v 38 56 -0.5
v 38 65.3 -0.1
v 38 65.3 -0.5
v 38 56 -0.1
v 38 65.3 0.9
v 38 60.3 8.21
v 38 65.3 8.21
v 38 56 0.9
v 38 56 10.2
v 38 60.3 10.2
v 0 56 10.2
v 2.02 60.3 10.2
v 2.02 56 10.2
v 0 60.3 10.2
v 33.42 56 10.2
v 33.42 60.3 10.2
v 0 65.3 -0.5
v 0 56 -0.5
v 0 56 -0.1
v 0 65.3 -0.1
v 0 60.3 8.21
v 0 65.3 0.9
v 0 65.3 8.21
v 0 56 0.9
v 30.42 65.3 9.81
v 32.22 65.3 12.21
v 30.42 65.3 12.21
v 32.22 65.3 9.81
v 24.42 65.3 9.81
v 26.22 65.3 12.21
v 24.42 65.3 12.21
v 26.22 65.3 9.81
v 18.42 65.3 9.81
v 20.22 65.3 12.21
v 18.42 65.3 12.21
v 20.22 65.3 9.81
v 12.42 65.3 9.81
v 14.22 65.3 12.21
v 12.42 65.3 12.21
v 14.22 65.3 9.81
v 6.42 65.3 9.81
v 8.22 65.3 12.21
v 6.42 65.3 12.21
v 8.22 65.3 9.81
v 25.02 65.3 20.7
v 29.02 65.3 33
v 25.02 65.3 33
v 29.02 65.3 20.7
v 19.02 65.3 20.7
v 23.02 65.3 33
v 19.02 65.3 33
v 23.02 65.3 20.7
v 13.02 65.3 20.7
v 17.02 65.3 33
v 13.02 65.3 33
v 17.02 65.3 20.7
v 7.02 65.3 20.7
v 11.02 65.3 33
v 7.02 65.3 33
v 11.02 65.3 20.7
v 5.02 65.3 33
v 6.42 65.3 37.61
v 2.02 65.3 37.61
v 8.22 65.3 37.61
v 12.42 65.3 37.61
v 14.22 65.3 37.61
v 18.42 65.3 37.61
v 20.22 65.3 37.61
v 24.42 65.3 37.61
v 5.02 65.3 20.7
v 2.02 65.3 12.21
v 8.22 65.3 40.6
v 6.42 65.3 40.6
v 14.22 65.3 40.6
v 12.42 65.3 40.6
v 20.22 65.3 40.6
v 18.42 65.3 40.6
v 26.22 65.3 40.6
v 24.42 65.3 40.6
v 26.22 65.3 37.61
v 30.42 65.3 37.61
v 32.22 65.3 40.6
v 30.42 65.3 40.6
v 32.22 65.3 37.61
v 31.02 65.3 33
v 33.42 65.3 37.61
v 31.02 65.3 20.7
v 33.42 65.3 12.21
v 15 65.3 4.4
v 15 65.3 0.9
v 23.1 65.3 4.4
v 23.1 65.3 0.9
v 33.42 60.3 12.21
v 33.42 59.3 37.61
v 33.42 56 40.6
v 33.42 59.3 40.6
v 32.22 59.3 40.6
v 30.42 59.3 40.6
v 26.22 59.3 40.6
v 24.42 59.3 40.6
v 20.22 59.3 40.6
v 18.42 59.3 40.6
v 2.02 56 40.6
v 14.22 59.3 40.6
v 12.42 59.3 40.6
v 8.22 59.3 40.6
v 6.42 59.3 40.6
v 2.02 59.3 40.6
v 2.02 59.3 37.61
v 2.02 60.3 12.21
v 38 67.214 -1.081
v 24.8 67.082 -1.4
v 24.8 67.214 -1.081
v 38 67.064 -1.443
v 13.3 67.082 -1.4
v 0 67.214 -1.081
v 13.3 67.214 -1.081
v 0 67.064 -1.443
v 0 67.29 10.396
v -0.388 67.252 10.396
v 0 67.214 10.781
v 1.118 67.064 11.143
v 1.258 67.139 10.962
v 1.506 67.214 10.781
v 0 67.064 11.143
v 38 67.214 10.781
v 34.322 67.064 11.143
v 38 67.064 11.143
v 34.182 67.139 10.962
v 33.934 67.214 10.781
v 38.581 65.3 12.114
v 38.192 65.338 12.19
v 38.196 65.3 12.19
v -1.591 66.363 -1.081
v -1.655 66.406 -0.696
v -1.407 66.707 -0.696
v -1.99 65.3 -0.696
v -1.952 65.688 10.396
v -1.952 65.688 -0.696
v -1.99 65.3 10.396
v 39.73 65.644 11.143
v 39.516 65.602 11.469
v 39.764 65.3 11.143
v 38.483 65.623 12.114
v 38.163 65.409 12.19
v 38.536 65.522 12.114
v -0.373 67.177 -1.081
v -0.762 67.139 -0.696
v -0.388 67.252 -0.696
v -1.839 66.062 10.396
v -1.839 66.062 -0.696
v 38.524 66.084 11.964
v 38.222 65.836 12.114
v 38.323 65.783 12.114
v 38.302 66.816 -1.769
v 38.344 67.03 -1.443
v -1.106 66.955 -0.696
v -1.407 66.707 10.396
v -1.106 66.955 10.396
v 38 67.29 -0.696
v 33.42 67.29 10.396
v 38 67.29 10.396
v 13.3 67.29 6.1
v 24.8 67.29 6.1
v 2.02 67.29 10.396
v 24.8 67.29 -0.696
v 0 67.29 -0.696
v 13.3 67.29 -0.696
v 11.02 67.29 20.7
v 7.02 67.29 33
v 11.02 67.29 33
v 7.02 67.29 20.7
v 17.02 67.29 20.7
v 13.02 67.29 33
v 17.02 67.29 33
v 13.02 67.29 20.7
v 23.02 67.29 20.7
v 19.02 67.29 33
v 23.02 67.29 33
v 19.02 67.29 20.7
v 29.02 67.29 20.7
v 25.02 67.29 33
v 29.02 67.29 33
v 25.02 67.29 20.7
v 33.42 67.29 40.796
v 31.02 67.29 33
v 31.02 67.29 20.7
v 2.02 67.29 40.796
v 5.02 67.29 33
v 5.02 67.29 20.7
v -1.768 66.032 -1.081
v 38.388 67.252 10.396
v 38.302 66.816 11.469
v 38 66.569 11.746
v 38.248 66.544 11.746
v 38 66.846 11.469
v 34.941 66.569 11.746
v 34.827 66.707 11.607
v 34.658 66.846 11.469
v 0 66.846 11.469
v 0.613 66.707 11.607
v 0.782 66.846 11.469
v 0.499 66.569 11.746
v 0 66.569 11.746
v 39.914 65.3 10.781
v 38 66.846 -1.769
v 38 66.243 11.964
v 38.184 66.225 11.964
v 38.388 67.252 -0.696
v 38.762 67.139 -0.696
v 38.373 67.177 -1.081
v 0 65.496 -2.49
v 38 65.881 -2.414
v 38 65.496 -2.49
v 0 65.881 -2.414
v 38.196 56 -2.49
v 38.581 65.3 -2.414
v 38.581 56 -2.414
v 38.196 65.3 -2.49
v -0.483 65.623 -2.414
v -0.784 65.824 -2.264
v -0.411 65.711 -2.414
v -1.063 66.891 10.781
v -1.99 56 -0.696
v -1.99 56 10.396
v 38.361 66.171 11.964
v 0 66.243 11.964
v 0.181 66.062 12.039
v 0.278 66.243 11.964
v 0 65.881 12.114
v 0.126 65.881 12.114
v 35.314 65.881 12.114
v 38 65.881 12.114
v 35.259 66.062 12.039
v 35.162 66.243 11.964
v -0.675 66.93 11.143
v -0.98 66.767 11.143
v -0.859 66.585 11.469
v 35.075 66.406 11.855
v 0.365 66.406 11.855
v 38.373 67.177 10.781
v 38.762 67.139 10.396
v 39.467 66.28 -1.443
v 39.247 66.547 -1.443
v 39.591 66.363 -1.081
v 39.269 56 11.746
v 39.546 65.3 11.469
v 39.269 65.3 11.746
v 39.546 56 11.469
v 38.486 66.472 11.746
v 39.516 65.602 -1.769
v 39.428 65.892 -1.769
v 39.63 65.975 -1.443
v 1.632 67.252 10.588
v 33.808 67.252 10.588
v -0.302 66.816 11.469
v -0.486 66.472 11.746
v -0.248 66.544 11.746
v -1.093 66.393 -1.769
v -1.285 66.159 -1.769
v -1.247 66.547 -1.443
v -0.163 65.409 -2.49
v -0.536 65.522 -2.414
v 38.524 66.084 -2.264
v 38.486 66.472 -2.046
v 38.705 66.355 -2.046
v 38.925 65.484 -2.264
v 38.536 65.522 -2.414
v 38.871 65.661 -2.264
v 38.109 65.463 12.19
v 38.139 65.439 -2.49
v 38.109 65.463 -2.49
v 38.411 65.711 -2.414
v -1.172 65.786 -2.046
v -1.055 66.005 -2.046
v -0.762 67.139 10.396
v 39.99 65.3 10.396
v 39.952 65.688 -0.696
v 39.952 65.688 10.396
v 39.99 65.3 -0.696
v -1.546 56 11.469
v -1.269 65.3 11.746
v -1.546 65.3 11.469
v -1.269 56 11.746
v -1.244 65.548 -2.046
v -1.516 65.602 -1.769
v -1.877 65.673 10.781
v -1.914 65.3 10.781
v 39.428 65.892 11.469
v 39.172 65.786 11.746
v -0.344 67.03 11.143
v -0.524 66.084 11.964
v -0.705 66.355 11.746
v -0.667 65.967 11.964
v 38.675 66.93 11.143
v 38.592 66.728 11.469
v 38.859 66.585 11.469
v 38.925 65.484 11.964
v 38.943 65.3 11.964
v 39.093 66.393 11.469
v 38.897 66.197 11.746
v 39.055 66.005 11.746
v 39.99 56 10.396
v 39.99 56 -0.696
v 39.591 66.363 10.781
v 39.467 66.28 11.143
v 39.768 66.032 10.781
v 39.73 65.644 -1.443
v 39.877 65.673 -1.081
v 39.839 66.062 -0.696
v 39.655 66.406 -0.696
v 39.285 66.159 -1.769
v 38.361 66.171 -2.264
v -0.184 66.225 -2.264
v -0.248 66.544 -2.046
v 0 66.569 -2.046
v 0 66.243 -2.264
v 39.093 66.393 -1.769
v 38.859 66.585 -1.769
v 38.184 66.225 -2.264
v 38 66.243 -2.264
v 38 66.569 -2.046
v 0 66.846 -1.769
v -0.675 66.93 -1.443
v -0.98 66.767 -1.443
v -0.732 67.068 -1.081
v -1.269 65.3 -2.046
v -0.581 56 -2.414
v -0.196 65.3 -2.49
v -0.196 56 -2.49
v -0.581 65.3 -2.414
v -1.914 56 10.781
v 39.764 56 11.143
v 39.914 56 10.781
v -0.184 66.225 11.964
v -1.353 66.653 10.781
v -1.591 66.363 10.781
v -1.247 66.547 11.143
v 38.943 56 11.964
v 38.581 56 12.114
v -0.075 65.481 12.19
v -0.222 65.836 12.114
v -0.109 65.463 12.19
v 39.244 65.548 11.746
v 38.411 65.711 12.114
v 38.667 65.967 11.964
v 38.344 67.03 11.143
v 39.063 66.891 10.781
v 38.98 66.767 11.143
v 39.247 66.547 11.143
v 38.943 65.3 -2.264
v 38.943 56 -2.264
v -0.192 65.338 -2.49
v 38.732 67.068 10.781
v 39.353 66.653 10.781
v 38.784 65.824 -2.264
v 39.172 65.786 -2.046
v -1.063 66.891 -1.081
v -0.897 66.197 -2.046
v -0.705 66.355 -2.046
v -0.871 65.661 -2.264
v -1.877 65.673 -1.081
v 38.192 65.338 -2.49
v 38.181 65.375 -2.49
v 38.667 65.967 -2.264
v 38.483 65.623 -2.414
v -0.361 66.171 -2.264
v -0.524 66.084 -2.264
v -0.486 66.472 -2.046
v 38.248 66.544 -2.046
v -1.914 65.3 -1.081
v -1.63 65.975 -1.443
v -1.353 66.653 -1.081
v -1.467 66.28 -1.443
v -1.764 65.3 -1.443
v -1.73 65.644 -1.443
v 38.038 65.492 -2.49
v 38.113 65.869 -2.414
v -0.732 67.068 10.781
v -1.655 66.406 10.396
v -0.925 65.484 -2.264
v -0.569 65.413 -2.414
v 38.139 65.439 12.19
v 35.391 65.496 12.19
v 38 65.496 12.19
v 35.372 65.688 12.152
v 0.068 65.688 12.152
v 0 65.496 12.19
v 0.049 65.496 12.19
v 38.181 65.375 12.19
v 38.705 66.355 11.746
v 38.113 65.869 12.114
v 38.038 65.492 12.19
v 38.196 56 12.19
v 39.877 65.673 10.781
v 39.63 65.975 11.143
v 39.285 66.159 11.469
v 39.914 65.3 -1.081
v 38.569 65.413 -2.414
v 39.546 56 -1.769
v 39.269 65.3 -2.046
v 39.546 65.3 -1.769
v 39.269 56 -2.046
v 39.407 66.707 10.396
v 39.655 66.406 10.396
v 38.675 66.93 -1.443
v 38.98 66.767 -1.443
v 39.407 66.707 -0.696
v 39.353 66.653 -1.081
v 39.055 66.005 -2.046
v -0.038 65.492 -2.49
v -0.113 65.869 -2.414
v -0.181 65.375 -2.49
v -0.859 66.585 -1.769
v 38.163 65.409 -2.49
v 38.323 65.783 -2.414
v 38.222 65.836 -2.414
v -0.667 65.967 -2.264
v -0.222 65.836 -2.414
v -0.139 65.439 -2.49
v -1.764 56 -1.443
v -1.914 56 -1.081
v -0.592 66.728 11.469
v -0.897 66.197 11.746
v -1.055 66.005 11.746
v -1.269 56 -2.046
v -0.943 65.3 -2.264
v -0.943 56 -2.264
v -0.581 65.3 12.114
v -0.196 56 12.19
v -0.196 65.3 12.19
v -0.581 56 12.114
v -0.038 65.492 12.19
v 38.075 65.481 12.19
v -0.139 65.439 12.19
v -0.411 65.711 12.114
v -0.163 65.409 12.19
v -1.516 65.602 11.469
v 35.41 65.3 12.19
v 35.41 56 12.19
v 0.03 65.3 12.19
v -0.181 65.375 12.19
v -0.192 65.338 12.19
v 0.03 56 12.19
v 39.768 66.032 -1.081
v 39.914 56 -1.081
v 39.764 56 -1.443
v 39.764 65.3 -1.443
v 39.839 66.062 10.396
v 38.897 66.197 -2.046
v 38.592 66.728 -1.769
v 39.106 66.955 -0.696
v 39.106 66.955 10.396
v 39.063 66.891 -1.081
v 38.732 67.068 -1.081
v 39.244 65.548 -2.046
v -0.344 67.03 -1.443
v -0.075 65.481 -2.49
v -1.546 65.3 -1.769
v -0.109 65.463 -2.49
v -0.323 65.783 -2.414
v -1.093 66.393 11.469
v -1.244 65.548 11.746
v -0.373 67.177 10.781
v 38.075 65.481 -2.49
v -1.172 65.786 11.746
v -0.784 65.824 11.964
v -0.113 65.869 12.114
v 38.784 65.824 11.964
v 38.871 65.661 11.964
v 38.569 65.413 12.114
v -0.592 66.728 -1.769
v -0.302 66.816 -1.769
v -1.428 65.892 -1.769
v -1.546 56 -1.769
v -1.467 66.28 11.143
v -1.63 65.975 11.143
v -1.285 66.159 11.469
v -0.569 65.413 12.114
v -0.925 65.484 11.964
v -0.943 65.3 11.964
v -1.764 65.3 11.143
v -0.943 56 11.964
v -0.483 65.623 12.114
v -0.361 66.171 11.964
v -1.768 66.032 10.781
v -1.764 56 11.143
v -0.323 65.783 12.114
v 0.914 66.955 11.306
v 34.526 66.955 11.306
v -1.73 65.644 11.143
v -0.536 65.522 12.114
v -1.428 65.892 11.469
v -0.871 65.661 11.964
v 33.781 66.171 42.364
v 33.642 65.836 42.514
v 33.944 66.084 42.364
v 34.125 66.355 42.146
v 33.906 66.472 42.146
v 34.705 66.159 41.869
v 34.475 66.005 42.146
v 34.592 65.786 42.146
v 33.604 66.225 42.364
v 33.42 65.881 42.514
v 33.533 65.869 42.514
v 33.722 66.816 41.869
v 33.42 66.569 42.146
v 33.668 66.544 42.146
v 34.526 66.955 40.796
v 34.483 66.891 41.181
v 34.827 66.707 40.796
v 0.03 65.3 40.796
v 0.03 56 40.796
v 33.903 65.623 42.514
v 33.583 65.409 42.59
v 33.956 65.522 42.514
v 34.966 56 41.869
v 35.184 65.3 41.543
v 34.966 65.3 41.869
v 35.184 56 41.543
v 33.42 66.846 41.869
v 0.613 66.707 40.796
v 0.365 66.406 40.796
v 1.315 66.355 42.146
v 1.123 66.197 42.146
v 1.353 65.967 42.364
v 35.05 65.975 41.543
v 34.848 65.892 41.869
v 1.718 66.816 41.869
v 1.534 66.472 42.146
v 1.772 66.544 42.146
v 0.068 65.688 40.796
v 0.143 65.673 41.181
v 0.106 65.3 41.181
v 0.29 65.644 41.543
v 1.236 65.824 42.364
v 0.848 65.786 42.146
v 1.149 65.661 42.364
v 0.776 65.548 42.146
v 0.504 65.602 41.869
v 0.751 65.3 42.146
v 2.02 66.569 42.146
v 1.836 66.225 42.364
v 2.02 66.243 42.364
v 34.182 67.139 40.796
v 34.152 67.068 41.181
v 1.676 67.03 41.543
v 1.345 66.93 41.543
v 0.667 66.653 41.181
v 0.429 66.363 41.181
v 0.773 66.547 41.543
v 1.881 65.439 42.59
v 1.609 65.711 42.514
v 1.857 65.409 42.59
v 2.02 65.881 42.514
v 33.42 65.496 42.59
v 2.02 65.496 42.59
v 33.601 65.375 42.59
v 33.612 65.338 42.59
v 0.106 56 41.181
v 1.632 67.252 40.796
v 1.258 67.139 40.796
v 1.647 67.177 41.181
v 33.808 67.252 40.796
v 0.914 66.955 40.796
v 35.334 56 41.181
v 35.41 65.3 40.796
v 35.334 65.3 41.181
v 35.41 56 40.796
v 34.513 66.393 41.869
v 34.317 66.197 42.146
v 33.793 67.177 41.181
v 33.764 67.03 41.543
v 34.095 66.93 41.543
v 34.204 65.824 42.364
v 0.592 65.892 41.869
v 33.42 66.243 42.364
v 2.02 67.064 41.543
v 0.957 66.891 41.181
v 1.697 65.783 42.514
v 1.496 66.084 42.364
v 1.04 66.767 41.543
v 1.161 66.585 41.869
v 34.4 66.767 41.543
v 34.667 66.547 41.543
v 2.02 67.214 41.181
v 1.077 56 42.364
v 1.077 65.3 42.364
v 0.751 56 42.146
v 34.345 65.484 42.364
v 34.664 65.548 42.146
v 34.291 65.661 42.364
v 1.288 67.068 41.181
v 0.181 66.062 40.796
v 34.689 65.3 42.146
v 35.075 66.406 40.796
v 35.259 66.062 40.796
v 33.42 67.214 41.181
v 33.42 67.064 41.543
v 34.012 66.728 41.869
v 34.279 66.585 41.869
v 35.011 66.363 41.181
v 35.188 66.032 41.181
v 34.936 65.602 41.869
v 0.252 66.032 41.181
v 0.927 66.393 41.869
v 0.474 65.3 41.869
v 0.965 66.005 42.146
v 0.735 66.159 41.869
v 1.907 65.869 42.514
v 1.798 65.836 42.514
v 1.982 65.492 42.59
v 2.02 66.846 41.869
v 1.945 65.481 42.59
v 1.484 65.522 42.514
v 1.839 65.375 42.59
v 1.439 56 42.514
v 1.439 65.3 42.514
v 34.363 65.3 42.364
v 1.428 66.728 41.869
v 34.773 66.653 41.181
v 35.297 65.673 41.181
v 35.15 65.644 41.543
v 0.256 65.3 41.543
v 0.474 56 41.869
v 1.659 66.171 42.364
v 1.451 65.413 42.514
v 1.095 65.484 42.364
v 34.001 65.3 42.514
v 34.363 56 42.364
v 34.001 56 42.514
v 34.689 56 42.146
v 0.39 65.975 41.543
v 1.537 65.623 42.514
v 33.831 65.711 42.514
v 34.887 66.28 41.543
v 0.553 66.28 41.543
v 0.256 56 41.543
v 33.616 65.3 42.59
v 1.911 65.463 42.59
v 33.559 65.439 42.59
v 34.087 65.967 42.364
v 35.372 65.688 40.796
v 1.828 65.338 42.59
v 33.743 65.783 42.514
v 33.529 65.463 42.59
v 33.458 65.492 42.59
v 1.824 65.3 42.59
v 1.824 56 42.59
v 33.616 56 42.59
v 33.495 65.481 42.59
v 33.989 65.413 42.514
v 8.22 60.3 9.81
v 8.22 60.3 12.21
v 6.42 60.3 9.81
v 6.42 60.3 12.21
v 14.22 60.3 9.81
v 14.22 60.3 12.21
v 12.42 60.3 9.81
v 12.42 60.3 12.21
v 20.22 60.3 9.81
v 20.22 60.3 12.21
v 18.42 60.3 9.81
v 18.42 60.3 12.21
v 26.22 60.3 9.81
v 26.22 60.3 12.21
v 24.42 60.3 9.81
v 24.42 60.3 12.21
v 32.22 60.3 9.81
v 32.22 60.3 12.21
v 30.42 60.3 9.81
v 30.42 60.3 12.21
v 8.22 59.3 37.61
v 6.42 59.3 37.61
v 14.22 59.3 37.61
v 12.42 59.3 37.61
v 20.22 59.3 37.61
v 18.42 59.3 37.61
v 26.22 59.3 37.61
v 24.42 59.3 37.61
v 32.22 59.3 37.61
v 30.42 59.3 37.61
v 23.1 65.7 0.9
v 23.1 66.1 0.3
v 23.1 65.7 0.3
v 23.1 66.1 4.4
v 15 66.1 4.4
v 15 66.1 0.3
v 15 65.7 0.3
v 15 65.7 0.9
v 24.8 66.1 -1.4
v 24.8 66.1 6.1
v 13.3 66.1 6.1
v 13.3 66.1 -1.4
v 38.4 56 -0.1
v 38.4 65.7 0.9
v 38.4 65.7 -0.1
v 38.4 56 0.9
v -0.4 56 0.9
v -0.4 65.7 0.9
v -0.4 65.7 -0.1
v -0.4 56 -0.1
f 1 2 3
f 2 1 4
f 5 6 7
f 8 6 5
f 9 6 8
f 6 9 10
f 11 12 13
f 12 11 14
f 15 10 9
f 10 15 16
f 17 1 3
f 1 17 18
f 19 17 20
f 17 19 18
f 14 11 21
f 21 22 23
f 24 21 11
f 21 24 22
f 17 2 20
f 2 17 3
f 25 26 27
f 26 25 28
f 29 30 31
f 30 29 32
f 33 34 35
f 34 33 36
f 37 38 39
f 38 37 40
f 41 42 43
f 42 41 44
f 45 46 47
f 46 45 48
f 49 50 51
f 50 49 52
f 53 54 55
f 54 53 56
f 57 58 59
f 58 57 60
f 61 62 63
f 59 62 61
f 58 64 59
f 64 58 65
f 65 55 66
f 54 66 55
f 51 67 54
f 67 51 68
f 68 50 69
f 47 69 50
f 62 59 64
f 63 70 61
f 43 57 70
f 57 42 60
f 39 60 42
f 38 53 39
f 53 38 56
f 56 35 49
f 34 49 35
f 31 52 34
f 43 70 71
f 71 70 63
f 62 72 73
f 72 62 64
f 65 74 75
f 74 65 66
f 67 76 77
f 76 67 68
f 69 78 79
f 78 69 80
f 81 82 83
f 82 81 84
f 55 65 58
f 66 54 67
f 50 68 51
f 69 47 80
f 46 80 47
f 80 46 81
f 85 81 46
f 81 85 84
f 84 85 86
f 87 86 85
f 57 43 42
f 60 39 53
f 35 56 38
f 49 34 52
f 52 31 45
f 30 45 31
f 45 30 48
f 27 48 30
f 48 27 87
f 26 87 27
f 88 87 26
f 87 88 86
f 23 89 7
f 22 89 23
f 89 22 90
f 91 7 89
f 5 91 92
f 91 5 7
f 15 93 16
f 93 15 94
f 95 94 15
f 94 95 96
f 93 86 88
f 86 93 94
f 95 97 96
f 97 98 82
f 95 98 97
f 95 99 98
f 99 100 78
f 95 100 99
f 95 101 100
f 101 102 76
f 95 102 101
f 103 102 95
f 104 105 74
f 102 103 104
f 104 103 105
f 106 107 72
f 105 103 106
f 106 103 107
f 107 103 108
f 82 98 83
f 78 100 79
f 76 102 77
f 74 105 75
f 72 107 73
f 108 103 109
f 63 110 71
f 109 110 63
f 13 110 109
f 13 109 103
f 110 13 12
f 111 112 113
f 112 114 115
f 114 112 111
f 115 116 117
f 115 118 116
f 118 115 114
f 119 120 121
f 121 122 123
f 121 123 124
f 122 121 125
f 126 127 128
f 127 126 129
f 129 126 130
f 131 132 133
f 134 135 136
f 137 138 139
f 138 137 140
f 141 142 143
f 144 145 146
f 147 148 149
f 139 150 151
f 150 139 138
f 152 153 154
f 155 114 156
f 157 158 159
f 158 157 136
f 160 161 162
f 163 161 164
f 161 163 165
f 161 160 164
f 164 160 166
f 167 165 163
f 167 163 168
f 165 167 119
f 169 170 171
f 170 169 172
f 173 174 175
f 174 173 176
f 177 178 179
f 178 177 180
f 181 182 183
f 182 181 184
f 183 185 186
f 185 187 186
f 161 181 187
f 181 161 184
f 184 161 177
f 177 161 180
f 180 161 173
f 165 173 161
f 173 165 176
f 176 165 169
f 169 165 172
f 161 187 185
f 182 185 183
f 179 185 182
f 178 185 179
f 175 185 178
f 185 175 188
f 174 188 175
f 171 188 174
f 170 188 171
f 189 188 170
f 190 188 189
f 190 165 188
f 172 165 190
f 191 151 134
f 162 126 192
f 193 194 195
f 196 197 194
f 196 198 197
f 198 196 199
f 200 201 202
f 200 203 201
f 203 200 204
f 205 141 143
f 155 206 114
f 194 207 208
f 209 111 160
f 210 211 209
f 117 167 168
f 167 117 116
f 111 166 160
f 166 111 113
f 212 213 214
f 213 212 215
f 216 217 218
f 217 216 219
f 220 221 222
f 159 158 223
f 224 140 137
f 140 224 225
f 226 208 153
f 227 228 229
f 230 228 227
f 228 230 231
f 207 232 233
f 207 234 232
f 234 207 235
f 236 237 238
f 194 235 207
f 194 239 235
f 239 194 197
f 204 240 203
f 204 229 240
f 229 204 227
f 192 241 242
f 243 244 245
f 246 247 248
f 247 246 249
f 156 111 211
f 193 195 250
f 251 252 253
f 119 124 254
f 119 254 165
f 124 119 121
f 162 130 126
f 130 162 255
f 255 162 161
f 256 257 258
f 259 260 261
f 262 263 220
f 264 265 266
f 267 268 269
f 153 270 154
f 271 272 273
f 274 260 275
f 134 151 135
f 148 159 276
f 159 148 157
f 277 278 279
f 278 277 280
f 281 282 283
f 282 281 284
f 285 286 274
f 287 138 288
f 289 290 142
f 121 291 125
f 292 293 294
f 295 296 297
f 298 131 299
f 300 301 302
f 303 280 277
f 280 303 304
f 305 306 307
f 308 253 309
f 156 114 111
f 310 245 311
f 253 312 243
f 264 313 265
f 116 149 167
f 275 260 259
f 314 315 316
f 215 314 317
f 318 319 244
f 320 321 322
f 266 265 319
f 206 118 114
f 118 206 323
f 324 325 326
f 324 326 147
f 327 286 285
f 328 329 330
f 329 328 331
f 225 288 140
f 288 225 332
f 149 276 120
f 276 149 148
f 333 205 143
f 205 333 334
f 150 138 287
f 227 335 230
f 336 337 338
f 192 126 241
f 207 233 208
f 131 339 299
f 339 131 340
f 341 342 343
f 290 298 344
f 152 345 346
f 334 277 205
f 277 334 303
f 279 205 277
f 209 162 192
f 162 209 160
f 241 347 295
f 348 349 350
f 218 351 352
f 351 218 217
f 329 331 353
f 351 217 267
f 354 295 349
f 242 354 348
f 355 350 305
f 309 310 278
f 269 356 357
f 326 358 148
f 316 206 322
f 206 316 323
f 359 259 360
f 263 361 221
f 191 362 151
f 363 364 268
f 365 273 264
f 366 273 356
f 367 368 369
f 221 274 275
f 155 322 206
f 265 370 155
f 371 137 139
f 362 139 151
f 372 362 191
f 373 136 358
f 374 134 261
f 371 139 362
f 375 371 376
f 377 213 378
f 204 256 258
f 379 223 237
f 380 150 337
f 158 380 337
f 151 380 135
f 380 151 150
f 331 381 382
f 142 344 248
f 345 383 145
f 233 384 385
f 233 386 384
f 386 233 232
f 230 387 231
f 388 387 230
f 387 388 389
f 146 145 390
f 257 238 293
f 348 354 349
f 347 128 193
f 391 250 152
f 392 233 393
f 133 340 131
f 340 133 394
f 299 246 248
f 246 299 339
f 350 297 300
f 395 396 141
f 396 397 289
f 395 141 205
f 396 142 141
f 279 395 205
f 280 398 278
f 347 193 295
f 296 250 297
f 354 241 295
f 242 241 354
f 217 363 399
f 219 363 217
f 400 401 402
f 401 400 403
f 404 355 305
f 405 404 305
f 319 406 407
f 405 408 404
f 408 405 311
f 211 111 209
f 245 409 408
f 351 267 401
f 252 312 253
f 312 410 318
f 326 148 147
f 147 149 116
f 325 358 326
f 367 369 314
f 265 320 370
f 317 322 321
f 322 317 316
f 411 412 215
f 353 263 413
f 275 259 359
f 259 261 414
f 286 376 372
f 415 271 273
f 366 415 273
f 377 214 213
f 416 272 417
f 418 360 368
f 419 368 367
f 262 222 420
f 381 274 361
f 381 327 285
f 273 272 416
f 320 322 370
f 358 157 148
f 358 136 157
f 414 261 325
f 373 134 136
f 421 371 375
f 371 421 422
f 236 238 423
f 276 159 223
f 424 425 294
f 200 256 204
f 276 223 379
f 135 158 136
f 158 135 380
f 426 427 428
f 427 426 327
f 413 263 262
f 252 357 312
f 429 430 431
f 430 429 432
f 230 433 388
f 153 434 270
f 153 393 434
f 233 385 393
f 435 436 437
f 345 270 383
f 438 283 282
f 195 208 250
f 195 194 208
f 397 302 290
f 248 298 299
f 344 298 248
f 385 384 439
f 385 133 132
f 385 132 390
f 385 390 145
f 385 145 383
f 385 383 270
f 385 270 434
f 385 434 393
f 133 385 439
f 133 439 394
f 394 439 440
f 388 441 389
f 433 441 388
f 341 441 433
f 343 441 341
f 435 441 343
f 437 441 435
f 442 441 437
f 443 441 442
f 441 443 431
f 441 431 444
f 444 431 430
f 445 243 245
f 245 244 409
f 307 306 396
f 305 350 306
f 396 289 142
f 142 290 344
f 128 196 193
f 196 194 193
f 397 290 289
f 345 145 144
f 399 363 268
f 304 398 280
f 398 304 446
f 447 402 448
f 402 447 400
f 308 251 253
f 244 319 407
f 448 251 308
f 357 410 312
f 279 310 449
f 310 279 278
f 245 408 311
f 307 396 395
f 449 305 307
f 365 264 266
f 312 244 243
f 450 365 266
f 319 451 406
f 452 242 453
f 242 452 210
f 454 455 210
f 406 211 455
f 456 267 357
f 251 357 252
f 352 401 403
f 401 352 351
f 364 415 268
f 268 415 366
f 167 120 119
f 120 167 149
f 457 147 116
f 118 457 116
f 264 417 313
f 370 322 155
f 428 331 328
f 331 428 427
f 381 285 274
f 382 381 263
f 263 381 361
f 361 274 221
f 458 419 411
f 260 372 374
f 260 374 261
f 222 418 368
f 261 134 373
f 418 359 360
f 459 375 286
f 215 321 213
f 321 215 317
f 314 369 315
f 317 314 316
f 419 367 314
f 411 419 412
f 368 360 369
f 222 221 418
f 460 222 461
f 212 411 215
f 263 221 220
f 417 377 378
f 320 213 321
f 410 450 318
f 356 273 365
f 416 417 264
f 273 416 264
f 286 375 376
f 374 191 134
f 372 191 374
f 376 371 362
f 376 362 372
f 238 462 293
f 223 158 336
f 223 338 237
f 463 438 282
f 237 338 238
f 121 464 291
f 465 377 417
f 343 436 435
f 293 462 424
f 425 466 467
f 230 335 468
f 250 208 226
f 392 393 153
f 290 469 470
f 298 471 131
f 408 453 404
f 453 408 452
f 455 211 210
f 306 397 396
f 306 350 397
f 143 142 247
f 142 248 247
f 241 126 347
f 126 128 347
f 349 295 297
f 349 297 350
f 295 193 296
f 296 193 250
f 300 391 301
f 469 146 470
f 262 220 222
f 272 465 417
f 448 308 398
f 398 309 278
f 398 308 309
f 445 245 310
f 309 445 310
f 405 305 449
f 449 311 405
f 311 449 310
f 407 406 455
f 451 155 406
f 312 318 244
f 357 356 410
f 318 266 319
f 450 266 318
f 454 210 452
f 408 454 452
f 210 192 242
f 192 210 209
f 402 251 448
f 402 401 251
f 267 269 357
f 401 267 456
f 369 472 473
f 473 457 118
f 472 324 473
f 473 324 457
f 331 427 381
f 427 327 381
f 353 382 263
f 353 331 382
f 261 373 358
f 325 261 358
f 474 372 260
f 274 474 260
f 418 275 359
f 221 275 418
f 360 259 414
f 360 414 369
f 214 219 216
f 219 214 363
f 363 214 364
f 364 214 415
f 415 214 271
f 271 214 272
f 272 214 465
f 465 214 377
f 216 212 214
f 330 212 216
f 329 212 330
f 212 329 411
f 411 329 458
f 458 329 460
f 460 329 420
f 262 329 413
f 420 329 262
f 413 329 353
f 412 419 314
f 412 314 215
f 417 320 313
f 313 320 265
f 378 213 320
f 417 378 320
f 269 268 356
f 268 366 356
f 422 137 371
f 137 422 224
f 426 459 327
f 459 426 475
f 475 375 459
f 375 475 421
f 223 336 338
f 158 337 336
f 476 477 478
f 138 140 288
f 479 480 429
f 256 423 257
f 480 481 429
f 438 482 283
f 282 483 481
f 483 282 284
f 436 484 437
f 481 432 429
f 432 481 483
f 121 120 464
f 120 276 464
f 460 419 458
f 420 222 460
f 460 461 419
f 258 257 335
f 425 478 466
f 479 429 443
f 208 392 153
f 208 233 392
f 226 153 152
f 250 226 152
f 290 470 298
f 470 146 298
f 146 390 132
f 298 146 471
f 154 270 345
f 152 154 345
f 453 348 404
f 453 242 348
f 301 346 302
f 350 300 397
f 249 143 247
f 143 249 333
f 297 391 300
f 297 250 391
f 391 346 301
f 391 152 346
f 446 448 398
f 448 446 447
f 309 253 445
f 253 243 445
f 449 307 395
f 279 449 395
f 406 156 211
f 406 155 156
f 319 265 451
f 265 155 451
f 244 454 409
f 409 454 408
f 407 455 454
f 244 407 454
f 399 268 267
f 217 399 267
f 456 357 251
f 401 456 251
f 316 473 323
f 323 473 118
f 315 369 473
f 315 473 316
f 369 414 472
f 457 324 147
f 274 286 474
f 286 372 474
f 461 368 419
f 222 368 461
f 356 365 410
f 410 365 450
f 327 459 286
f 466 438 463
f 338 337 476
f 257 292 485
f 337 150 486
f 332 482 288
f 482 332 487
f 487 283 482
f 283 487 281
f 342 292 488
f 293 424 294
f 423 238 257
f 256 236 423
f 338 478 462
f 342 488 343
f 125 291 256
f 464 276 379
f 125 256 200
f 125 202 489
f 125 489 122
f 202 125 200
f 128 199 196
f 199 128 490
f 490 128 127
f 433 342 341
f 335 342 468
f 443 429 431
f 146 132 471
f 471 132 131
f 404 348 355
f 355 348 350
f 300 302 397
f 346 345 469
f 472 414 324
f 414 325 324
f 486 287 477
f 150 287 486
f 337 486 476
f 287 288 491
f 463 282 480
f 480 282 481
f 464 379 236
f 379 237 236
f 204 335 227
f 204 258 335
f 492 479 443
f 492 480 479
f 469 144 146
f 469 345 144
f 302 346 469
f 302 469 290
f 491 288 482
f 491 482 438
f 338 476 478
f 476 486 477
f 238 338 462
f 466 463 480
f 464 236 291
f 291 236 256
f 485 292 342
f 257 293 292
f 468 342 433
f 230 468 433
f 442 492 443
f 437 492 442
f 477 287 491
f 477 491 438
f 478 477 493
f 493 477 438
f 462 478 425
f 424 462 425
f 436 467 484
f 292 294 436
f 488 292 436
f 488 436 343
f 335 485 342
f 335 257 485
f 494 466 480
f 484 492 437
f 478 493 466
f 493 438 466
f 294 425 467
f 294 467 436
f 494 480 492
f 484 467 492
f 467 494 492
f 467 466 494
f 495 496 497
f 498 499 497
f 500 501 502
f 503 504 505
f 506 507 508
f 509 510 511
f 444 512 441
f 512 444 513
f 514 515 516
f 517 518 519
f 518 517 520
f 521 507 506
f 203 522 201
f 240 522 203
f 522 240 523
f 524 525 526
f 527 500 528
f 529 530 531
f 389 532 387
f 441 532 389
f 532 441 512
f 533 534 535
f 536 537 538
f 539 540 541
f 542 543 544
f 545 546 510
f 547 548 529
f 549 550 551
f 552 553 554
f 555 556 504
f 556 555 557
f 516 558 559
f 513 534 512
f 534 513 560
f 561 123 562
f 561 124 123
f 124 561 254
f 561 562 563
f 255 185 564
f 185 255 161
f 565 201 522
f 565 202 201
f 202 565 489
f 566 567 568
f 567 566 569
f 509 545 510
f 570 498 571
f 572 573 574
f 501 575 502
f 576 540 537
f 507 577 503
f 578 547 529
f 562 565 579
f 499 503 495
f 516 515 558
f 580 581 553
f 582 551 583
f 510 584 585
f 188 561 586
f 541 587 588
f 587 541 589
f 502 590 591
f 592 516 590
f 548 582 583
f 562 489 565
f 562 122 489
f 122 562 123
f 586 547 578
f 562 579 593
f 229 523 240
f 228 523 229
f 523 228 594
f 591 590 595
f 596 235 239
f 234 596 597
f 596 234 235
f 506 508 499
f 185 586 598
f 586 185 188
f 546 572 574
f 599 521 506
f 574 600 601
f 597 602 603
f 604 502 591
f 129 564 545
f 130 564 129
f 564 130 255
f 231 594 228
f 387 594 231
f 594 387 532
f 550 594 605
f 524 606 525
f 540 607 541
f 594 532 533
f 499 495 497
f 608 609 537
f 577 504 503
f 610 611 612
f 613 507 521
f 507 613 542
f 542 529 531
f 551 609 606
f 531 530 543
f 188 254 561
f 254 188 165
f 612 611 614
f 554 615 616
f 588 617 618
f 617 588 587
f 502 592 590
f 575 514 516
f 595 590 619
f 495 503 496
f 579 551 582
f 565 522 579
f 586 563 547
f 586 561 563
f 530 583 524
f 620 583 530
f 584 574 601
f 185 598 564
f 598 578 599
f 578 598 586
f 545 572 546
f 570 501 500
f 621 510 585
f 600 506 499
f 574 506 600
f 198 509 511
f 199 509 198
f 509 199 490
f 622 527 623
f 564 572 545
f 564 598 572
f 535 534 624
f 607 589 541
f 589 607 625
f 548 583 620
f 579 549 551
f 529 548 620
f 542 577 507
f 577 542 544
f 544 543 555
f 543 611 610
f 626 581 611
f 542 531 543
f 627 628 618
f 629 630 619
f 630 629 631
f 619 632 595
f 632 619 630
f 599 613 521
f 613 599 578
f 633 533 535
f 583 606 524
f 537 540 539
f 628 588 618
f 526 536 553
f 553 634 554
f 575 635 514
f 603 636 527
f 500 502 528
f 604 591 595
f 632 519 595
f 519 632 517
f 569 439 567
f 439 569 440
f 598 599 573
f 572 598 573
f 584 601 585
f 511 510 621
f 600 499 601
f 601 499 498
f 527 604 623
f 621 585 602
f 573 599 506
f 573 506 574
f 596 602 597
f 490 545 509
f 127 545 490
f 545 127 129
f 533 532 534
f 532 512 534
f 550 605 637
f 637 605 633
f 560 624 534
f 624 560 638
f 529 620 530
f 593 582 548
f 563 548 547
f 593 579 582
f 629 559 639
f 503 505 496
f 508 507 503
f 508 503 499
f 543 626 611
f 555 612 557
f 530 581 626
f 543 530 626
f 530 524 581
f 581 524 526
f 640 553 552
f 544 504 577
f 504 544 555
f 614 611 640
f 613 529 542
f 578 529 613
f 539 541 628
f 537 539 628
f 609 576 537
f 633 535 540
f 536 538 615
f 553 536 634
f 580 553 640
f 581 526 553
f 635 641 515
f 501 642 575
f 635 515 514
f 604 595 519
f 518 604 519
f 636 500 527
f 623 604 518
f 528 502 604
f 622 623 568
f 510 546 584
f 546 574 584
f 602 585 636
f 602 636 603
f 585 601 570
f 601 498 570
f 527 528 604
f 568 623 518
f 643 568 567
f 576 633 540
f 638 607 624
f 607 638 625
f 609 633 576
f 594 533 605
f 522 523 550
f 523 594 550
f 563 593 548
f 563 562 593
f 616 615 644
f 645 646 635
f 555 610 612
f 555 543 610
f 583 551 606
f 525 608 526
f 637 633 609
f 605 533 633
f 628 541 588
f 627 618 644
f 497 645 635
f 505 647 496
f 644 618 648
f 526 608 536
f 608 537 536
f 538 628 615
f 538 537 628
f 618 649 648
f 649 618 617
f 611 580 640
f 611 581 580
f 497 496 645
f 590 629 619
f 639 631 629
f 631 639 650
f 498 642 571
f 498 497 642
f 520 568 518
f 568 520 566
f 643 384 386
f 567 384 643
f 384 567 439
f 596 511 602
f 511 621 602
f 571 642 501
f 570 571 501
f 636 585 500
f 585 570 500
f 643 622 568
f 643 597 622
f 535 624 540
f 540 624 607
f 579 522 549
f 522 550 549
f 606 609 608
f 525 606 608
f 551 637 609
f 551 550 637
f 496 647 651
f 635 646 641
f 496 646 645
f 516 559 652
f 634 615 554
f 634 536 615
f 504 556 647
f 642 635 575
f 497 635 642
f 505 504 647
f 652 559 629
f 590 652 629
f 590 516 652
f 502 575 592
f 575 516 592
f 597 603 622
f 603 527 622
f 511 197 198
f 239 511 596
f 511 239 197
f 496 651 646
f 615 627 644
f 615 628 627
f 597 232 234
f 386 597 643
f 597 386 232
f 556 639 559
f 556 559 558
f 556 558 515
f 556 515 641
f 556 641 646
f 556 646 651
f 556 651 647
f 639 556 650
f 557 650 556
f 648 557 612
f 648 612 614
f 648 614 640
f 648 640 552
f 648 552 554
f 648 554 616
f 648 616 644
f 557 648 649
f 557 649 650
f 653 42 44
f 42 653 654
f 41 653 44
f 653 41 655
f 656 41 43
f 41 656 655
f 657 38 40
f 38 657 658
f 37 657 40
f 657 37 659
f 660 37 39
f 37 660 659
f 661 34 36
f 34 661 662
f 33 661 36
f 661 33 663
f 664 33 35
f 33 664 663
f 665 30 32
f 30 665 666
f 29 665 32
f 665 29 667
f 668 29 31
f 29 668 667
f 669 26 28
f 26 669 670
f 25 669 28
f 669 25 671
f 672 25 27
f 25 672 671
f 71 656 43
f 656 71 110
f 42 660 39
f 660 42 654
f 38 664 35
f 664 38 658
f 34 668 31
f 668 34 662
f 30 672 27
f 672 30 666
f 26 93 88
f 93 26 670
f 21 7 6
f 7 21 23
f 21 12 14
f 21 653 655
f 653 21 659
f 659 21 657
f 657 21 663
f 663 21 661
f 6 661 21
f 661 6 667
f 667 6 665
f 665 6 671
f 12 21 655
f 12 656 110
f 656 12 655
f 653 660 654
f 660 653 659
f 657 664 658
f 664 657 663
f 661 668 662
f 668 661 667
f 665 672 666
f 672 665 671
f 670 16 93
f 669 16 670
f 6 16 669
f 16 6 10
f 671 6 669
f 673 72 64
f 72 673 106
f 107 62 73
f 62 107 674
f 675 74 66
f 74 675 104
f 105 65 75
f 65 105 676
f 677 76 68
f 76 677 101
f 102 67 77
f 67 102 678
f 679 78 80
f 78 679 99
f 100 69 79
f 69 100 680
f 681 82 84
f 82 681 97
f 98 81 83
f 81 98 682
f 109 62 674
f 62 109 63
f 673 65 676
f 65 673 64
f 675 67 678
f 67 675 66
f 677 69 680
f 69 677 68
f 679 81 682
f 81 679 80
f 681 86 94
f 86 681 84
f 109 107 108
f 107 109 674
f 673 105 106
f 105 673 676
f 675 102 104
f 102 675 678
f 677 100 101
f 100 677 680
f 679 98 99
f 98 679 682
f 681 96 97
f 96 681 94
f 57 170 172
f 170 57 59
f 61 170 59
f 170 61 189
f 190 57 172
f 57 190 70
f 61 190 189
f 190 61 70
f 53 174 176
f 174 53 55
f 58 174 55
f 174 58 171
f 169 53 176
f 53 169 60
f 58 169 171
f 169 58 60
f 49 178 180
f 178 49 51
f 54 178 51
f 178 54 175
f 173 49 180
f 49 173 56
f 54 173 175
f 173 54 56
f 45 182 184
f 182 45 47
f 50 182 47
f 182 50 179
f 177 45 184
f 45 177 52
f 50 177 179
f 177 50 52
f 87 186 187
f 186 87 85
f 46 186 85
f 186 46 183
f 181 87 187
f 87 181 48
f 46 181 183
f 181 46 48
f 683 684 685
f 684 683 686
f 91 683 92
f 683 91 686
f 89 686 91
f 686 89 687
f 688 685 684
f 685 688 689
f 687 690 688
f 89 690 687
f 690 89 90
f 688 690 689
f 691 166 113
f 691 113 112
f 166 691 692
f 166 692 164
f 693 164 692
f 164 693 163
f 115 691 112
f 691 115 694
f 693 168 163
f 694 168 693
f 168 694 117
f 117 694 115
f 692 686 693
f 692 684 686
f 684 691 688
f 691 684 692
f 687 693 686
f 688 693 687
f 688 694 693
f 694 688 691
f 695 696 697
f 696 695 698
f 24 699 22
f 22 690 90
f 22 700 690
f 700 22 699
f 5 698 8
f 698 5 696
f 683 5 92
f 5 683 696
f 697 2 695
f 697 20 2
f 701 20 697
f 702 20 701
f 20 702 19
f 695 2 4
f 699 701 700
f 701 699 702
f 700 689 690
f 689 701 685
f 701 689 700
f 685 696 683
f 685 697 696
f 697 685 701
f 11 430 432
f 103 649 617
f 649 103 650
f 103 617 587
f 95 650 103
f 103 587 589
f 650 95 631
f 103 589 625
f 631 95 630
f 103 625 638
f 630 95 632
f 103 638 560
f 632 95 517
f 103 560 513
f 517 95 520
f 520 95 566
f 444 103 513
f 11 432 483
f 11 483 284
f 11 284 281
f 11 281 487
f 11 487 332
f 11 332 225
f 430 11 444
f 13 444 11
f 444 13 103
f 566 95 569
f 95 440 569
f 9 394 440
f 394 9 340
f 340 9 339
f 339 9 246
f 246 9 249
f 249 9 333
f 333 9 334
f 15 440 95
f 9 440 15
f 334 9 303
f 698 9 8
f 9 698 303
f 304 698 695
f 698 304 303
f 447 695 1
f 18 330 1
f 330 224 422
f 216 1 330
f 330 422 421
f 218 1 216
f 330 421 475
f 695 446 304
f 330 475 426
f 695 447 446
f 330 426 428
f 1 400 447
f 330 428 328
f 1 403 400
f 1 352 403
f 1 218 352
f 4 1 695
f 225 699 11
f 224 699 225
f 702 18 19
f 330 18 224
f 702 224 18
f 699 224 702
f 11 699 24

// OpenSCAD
// file: terrible.scad
PI_SLOT_SPACING=6;

module terrible_backplane() {
	translate([129.55,-76.46,0.4]) rotate([0,0,180]) import("terrible.stl",convexity=3);
}

module pi_zeros() {

	for(pi_slot=[0:4])
	{
		translate([32.55+(pi_slot*PI_SLOT_SPACING),114.83,-39.8]) rotate([90,0,-90]) {
			import( "pi0computer.stl",convexity=3);
			translate([24.7,0,4.8])
				import( "pi0sdcard.stl",convexity=3);
		}
	}
}

terrible_backplane();
%pi_zeros();
// main file
use <terrible.scad>;


X_EDGE_TO_HEAD_NODE_TOP=6.5;


//{
//    #terrible_backplane();
//    #pi_zeros();
//}

PCB_EDGE_X=38;
PCB_EDGE_XY_CLEARANCE=0.8;
PCB_EDGE_Y=65.3;
PCB_EDGE_Z=0.8;
PCB_EDGE_Z_CLEARANCE=0.2;
PCB_BOT_CLEARANCE=0.5;


PI_BOT=9.4; /* top of PCB to bottom of Pi */
PI_WIDTH=30.0;
PI_WIDTH_CLEARANCE=.8;

PI_CAM_HDR_WIDTH=17.5;
PI_CAM_HDR_HEIGHT=1.4;
PI_CAM_HDR_FROM_EDGE=6.2;
PI_CAM_HDR_EXT=1;

PI_ZERO_BOARD_EDGE_OFS_FROM_0=8.02;
PI_ZERO_BOARD_TOP_OFS_FROM_4=4.58;
PI_ZERO_BOARD_TOP_CLEARANCE=6;
PI_ZERO_BOARD_THICK=1.4;

INT_HEIGHT=PCB_EDGE_Z+PI_BOT+PI_WIDTH+PI_WIDTH_CLEARANCE/2;

SDCARD_WIDTH=12.3;
SDCARD_EXT=4;
SDCARD_FROM_EDGE=10.5;
SDCARD_THICK=2;
SDCARD_Z_FUDGE=0.4;

USB_FROM_0=15;
USB_WIDTH=8.1;
USB_HEIGHT=3.6;
USB_EXT=4;
USB_Z_FUDGE=0.5;

USB_INSET_DEPTH=1.2;
USB_INSET_ADDL_W=3.4;
USB_INSET_ADDL_H=3.4;

CASE_THICK=2;



PI_LOWER_CRADLE_L=5;
PI_LOWER_CRADLE_H=4;
PI_LOWER_CRADLE_NOTCH=2;

PI_UPPER_CRADLE_L=6;
PI_UPPER_CRADLE_H=3;



SEAM_FROM_BACK=10;

PI_SLOT_SPACING=6;

difference() {
difference() {
    outer_shape_curvy();
    
    difference()
    {
        inner_bulk_cutout();
        zero_lower_cradle();
        zero_upper_cradle_far();
    }
    inner_pcb_cutout();
    sdcard_cutouts();
    usb_cutout();
}
    translate([-10,-10,-10]) cube([80,66,80]);
}

module outer_shape() {
    translate([-CASE_THICK, -(CASE_THICK+PI_CAM_HDR_EXT), -(CASE_THICK+PCB_BOT_CLEARANCE)] )
        minkowski() {
            cube([CASE_THICK*2+PCB_EDGE_X,CASE_THICK*2+PCB_EDGE_Y+PI_CAM_HDR_EXT,CASE_THICK*2+INT_HEIGHT+PCB_BOT_CLEARANCE]);
        sphere(r=0.01, $fn=32);
    }
}

module outer_shape_curvy() {
    
    minkowski() {
        inner_bulk_cutout();
        sphere(CASE_THICK,$fn=32);
    }

}

module inner_bulk_cutout() {
    union()
    {
        translate([0, 0, -PCB_BOT_CLEARANCE] ) 
            cube([PCB_EDGE_X, PCB_EDGE_Y,PCB_EDGE_Z+PI_BOT+PCB_BOT_CLEARANCE]);
        
        translate([PI_ZERO_BOARD_EDGE_OFS_FROM_0-PI_ZERO_BOARD_TOP_CLEARANCE,-PI_CAM_HDR_EXT,PI_BOT])
        cube([PI_ZERO_BOARD_TOP_CLEARANCE+PI_ZERO_BOARD_THICK+24,PCB_EDGE_Y+PI_CAM_HDR_EXT,INT_HEIGHT-PI_BOT]);
    }
}

module inner_pcb_cutout() {
translate([-PCB_EDGE_XY_CLEARANCE/2, -PCB_EDGE_XY_CLEARANCE/2, -PCB_EDGE_Z_CLEARANCE/2] ) 
            cube([PCB_EDGE_X+PCB_EDGE_XY_CLEARANCE, PCB_EDGE_Y+PCB_EDGE_XY_CLEARANCE,PCB_EDGE_Z+PCB_EDGE_Z_CLEARANCE]);
 }

module sdcard_cutouts() {
    for(pi_slot=[0:4]) {
        translate([PI_ZERO_BOARD_EDGE_OFS_FROM_0+(pi_slot*PI_SLOT_SPACING)+SDCARD_Z_FUDGE-SDCARD_THICK-PI_ZERO_BOARD_THICK, PCB_EDGE_Y-1, SDCARD_FROM_EDGE+PI_BOT+PCB_EDGE_Z])
            cube([SDCARD_THICK,SDCARD_EXT,SDCARD_WIDTH]);
    }
}

module usb_cutout() {
    union() {
        translate([USB_FROM_0, PCB_EDGE_Y-1, PCB_EDGE_Z-USB_Z_FUDGE])
            cube([USB_WIDTH, USB_EXT, USB_HEIGHT+USB_Z_FUDGE]);
        translate([USB_FROM_0-USB_INSET_ADDL_W/2,PCB_EDGE_Y+CASE_THICK-USB_INSET_DEPTH, PCB_EDGE_Z-USB_Z_FUDGE-USB_INSET_ADDL_H/2])
            cube([USB_WIDTH+USB_INSET_ADDL_W, USB_INSET_DEPTH*2, USB_HEIGHT+USB_Z_FUDGE+USB_INSET_ADDL_W]);
    }
}

module zero_lower_cradle() {
    difference() {
    translate([-0.01, PCB_EDGE_Y-PI_LOWER_CRADLE_L, PCB_EDGE_Z+PI_BOT-PI_LOWER_CRADLE_H+PI_LOWER_CRADLE_NOTCH+0.01] ) 
            cube([PCB_EDGE_X+0.02, PI_LOWER_CRADLE_L+0.01,PI_LOWER_CRADLE_H]);
    for(pi_slot=[0:4]) {
        translate([PI_ZERO_BOARD_EDGE_OFS_FROM_0+(pi_slot*PI_SLOT_SPACING)-PI_ZERO_BOARD_THICK-0.2, PCB_EDGE_Y-PI_LOWER_CRADLE_L-0.01, PCB_EDGE_Z+PI_BOT-PI_WIDTH_CLEARANCE/2+0.01])
            cube([PI_ZERO_BOARD_THICK+0.4,PI_LOWER_CRADLE_L+0.01,PI_LOWER_CRADLE_NOTCH+PI_WIDTH_CLEARANCE/2+0.01]);
    }
    }
}

module zero_upper_cradle_far() {
    difference() {
    translate([-0.01, PCB_EDGE_Y-PI_UPPER_CRADLE_L, INT_HEIGHT-PI_UPPER_CRADLE_H+0.01] ) 
            cube([PCB_EDGE_X+0.02, PI_UPPER_CRADLE_L+0.01,PI_UPPER_CRADLE_H]);
    for(pi_slot=[0:4]) {
        translate([PI_ZERO_BOARD_EDGE_OFS_FROM_0+(pi_slot*PI_SLOT_SPACING)-PI_ZERO_BOARD_THICK-0.2, PCB_EDGE_Y-PI_UPPER_CRADLE_L-0.01, INT_HEIGHT-PI_UPPER_CRADLE_H-0.01])
            cube([PI_ZERO_BOARD_THICK+0.4,PI_UPPER_CRADLE_L+0.01,PI_UPPER_CRADLE_H+PI_WIDTH_CLEARANCE/2+0.01]);
    }
    }
}
